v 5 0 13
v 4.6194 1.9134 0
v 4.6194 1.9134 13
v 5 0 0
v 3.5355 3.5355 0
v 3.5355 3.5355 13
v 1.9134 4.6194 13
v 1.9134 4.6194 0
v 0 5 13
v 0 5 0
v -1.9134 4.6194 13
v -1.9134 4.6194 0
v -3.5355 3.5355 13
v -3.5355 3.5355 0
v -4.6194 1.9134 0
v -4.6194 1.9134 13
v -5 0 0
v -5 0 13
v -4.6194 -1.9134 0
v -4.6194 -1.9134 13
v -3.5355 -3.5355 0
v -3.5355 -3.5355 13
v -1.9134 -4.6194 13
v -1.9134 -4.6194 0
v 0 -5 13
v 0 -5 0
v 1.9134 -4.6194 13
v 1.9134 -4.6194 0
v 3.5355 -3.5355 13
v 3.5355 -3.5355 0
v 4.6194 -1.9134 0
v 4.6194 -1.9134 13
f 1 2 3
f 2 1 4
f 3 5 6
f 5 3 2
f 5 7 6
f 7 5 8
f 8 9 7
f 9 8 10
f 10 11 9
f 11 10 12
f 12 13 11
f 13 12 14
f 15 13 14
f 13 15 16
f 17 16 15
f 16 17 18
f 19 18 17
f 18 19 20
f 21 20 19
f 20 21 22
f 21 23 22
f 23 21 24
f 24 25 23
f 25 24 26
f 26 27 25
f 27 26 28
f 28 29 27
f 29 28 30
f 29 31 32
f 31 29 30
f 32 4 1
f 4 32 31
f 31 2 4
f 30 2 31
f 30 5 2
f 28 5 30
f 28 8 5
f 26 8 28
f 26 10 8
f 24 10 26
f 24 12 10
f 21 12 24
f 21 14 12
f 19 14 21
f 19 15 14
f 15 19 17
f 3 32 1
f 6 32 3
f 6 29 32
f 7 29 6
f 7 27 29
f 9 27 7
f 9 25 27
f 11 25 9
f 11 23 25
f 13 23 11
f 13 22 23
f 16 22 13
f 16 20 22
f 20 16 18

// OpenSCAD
// Generated by SolidPython 1.0.1 on 2020-07-29 00:46:44


cylinder(h = 13, r1 = 5, r2 = 5);
/***********************************************
*********      SolidPython code:      **********
************************************************
 
# import packages: SolidPython
from solid import *
from solid.utils import *
from itertools import chain, combinations, permutations


class Resize:

    def __init__(self, scad_file):
        self.scad_file = scad_file
        #self.scad_file = import_scad(scad_file)
        # cone/cylinder param:
        self.r1 = 0
        self.r2 = 0
        self.h = 0
        # rectangular prism param:
        self.w = 0
        self.l = 0
        # ellipse param:
        self.r = 0

    # import OpenScad code (file name corresponds to shape)


    # classify shape + parameters
    def assign(self, param1, param2, param3):
        if self.scad_file == 'cone.scad':
            self.r1 = param1
            self.r2 = param2
            self.h = param3
        elif self.scad_file == 'cylinder.scad':
            self.r1 = param1
            self.r2 = param2
            self.h = param3
        elif self.scad_file == 'rectangularPrism.scad':
            self.h = param1
            self.l = param2
            self.w = param3
        else:
            self.r = param1
            self.h = param2

    # resize parameters
    def iterate(self):
        x = range(3, 20, 2)
        i = 1
        if self.scad_file == 'cone.scad':
            tempList = list(permutations(x, 2))
            for temp in tempList:
                param1 = temp[0]
                param2 = temp[1]
                filepath = 'produced_scad_files/' + 'cone' + str(param1) + '_' + str(param2) + '_' + '.scad'
                scad_render_to_file(cylinder(h=param1, r1=param2, r2=0), filepath)

        elif self.scad_file == 'cylinder.scad':
            tempList = list(permutations(x, 3))
            for temp in tempList:
                param1 = temp[0]
                param2 = temp[1]
                filepath = 'produced_scad_files/' + 'cylinder' + str(param1) + '_' + str(param2) + '_' + '.scad'
                scad_render_to_file(cylinder(h=param1, r1=param2, r2=param2), filepath)

        elif self.scad_file == 'rectangularPrism.scad':
            tempList = list(permutations(x, 3))
            for temp in tempList:
                param1 = temp[0]
                param2 = temp[1]
                param3 = temp[2]
                filepath = 'produced_scad_files/' + 'rectangularPrism' + str(param1) + '_' + str(param2) + '_' + str(
                    param3) + '.scad'
                scad_render_to_file(cube(size=(param1, param2, param3)), filepath)

        elif self.scad_file == 'ellipse.scad':
            tempList = list(permutations(x, 4))
            for temp in tempList:
                param1 = temp[0]
                param2 = temp[1]
                param3 = temp[2]
                param4 = temp[3]
                filepath = 'produced_scad_files/' + 'ellipse' + str(param1) + '_' + str(param2) + '_' + str(param3) + '_' + str(param4) + '.scad'
                scad_render_to_file(scale([param1, param2, param3])(sphere(r=param4)), filepath)

    def render_to_scadfile(self):
        scad_render_to_file(scad, 'example.scad') 
 
************************************************/
